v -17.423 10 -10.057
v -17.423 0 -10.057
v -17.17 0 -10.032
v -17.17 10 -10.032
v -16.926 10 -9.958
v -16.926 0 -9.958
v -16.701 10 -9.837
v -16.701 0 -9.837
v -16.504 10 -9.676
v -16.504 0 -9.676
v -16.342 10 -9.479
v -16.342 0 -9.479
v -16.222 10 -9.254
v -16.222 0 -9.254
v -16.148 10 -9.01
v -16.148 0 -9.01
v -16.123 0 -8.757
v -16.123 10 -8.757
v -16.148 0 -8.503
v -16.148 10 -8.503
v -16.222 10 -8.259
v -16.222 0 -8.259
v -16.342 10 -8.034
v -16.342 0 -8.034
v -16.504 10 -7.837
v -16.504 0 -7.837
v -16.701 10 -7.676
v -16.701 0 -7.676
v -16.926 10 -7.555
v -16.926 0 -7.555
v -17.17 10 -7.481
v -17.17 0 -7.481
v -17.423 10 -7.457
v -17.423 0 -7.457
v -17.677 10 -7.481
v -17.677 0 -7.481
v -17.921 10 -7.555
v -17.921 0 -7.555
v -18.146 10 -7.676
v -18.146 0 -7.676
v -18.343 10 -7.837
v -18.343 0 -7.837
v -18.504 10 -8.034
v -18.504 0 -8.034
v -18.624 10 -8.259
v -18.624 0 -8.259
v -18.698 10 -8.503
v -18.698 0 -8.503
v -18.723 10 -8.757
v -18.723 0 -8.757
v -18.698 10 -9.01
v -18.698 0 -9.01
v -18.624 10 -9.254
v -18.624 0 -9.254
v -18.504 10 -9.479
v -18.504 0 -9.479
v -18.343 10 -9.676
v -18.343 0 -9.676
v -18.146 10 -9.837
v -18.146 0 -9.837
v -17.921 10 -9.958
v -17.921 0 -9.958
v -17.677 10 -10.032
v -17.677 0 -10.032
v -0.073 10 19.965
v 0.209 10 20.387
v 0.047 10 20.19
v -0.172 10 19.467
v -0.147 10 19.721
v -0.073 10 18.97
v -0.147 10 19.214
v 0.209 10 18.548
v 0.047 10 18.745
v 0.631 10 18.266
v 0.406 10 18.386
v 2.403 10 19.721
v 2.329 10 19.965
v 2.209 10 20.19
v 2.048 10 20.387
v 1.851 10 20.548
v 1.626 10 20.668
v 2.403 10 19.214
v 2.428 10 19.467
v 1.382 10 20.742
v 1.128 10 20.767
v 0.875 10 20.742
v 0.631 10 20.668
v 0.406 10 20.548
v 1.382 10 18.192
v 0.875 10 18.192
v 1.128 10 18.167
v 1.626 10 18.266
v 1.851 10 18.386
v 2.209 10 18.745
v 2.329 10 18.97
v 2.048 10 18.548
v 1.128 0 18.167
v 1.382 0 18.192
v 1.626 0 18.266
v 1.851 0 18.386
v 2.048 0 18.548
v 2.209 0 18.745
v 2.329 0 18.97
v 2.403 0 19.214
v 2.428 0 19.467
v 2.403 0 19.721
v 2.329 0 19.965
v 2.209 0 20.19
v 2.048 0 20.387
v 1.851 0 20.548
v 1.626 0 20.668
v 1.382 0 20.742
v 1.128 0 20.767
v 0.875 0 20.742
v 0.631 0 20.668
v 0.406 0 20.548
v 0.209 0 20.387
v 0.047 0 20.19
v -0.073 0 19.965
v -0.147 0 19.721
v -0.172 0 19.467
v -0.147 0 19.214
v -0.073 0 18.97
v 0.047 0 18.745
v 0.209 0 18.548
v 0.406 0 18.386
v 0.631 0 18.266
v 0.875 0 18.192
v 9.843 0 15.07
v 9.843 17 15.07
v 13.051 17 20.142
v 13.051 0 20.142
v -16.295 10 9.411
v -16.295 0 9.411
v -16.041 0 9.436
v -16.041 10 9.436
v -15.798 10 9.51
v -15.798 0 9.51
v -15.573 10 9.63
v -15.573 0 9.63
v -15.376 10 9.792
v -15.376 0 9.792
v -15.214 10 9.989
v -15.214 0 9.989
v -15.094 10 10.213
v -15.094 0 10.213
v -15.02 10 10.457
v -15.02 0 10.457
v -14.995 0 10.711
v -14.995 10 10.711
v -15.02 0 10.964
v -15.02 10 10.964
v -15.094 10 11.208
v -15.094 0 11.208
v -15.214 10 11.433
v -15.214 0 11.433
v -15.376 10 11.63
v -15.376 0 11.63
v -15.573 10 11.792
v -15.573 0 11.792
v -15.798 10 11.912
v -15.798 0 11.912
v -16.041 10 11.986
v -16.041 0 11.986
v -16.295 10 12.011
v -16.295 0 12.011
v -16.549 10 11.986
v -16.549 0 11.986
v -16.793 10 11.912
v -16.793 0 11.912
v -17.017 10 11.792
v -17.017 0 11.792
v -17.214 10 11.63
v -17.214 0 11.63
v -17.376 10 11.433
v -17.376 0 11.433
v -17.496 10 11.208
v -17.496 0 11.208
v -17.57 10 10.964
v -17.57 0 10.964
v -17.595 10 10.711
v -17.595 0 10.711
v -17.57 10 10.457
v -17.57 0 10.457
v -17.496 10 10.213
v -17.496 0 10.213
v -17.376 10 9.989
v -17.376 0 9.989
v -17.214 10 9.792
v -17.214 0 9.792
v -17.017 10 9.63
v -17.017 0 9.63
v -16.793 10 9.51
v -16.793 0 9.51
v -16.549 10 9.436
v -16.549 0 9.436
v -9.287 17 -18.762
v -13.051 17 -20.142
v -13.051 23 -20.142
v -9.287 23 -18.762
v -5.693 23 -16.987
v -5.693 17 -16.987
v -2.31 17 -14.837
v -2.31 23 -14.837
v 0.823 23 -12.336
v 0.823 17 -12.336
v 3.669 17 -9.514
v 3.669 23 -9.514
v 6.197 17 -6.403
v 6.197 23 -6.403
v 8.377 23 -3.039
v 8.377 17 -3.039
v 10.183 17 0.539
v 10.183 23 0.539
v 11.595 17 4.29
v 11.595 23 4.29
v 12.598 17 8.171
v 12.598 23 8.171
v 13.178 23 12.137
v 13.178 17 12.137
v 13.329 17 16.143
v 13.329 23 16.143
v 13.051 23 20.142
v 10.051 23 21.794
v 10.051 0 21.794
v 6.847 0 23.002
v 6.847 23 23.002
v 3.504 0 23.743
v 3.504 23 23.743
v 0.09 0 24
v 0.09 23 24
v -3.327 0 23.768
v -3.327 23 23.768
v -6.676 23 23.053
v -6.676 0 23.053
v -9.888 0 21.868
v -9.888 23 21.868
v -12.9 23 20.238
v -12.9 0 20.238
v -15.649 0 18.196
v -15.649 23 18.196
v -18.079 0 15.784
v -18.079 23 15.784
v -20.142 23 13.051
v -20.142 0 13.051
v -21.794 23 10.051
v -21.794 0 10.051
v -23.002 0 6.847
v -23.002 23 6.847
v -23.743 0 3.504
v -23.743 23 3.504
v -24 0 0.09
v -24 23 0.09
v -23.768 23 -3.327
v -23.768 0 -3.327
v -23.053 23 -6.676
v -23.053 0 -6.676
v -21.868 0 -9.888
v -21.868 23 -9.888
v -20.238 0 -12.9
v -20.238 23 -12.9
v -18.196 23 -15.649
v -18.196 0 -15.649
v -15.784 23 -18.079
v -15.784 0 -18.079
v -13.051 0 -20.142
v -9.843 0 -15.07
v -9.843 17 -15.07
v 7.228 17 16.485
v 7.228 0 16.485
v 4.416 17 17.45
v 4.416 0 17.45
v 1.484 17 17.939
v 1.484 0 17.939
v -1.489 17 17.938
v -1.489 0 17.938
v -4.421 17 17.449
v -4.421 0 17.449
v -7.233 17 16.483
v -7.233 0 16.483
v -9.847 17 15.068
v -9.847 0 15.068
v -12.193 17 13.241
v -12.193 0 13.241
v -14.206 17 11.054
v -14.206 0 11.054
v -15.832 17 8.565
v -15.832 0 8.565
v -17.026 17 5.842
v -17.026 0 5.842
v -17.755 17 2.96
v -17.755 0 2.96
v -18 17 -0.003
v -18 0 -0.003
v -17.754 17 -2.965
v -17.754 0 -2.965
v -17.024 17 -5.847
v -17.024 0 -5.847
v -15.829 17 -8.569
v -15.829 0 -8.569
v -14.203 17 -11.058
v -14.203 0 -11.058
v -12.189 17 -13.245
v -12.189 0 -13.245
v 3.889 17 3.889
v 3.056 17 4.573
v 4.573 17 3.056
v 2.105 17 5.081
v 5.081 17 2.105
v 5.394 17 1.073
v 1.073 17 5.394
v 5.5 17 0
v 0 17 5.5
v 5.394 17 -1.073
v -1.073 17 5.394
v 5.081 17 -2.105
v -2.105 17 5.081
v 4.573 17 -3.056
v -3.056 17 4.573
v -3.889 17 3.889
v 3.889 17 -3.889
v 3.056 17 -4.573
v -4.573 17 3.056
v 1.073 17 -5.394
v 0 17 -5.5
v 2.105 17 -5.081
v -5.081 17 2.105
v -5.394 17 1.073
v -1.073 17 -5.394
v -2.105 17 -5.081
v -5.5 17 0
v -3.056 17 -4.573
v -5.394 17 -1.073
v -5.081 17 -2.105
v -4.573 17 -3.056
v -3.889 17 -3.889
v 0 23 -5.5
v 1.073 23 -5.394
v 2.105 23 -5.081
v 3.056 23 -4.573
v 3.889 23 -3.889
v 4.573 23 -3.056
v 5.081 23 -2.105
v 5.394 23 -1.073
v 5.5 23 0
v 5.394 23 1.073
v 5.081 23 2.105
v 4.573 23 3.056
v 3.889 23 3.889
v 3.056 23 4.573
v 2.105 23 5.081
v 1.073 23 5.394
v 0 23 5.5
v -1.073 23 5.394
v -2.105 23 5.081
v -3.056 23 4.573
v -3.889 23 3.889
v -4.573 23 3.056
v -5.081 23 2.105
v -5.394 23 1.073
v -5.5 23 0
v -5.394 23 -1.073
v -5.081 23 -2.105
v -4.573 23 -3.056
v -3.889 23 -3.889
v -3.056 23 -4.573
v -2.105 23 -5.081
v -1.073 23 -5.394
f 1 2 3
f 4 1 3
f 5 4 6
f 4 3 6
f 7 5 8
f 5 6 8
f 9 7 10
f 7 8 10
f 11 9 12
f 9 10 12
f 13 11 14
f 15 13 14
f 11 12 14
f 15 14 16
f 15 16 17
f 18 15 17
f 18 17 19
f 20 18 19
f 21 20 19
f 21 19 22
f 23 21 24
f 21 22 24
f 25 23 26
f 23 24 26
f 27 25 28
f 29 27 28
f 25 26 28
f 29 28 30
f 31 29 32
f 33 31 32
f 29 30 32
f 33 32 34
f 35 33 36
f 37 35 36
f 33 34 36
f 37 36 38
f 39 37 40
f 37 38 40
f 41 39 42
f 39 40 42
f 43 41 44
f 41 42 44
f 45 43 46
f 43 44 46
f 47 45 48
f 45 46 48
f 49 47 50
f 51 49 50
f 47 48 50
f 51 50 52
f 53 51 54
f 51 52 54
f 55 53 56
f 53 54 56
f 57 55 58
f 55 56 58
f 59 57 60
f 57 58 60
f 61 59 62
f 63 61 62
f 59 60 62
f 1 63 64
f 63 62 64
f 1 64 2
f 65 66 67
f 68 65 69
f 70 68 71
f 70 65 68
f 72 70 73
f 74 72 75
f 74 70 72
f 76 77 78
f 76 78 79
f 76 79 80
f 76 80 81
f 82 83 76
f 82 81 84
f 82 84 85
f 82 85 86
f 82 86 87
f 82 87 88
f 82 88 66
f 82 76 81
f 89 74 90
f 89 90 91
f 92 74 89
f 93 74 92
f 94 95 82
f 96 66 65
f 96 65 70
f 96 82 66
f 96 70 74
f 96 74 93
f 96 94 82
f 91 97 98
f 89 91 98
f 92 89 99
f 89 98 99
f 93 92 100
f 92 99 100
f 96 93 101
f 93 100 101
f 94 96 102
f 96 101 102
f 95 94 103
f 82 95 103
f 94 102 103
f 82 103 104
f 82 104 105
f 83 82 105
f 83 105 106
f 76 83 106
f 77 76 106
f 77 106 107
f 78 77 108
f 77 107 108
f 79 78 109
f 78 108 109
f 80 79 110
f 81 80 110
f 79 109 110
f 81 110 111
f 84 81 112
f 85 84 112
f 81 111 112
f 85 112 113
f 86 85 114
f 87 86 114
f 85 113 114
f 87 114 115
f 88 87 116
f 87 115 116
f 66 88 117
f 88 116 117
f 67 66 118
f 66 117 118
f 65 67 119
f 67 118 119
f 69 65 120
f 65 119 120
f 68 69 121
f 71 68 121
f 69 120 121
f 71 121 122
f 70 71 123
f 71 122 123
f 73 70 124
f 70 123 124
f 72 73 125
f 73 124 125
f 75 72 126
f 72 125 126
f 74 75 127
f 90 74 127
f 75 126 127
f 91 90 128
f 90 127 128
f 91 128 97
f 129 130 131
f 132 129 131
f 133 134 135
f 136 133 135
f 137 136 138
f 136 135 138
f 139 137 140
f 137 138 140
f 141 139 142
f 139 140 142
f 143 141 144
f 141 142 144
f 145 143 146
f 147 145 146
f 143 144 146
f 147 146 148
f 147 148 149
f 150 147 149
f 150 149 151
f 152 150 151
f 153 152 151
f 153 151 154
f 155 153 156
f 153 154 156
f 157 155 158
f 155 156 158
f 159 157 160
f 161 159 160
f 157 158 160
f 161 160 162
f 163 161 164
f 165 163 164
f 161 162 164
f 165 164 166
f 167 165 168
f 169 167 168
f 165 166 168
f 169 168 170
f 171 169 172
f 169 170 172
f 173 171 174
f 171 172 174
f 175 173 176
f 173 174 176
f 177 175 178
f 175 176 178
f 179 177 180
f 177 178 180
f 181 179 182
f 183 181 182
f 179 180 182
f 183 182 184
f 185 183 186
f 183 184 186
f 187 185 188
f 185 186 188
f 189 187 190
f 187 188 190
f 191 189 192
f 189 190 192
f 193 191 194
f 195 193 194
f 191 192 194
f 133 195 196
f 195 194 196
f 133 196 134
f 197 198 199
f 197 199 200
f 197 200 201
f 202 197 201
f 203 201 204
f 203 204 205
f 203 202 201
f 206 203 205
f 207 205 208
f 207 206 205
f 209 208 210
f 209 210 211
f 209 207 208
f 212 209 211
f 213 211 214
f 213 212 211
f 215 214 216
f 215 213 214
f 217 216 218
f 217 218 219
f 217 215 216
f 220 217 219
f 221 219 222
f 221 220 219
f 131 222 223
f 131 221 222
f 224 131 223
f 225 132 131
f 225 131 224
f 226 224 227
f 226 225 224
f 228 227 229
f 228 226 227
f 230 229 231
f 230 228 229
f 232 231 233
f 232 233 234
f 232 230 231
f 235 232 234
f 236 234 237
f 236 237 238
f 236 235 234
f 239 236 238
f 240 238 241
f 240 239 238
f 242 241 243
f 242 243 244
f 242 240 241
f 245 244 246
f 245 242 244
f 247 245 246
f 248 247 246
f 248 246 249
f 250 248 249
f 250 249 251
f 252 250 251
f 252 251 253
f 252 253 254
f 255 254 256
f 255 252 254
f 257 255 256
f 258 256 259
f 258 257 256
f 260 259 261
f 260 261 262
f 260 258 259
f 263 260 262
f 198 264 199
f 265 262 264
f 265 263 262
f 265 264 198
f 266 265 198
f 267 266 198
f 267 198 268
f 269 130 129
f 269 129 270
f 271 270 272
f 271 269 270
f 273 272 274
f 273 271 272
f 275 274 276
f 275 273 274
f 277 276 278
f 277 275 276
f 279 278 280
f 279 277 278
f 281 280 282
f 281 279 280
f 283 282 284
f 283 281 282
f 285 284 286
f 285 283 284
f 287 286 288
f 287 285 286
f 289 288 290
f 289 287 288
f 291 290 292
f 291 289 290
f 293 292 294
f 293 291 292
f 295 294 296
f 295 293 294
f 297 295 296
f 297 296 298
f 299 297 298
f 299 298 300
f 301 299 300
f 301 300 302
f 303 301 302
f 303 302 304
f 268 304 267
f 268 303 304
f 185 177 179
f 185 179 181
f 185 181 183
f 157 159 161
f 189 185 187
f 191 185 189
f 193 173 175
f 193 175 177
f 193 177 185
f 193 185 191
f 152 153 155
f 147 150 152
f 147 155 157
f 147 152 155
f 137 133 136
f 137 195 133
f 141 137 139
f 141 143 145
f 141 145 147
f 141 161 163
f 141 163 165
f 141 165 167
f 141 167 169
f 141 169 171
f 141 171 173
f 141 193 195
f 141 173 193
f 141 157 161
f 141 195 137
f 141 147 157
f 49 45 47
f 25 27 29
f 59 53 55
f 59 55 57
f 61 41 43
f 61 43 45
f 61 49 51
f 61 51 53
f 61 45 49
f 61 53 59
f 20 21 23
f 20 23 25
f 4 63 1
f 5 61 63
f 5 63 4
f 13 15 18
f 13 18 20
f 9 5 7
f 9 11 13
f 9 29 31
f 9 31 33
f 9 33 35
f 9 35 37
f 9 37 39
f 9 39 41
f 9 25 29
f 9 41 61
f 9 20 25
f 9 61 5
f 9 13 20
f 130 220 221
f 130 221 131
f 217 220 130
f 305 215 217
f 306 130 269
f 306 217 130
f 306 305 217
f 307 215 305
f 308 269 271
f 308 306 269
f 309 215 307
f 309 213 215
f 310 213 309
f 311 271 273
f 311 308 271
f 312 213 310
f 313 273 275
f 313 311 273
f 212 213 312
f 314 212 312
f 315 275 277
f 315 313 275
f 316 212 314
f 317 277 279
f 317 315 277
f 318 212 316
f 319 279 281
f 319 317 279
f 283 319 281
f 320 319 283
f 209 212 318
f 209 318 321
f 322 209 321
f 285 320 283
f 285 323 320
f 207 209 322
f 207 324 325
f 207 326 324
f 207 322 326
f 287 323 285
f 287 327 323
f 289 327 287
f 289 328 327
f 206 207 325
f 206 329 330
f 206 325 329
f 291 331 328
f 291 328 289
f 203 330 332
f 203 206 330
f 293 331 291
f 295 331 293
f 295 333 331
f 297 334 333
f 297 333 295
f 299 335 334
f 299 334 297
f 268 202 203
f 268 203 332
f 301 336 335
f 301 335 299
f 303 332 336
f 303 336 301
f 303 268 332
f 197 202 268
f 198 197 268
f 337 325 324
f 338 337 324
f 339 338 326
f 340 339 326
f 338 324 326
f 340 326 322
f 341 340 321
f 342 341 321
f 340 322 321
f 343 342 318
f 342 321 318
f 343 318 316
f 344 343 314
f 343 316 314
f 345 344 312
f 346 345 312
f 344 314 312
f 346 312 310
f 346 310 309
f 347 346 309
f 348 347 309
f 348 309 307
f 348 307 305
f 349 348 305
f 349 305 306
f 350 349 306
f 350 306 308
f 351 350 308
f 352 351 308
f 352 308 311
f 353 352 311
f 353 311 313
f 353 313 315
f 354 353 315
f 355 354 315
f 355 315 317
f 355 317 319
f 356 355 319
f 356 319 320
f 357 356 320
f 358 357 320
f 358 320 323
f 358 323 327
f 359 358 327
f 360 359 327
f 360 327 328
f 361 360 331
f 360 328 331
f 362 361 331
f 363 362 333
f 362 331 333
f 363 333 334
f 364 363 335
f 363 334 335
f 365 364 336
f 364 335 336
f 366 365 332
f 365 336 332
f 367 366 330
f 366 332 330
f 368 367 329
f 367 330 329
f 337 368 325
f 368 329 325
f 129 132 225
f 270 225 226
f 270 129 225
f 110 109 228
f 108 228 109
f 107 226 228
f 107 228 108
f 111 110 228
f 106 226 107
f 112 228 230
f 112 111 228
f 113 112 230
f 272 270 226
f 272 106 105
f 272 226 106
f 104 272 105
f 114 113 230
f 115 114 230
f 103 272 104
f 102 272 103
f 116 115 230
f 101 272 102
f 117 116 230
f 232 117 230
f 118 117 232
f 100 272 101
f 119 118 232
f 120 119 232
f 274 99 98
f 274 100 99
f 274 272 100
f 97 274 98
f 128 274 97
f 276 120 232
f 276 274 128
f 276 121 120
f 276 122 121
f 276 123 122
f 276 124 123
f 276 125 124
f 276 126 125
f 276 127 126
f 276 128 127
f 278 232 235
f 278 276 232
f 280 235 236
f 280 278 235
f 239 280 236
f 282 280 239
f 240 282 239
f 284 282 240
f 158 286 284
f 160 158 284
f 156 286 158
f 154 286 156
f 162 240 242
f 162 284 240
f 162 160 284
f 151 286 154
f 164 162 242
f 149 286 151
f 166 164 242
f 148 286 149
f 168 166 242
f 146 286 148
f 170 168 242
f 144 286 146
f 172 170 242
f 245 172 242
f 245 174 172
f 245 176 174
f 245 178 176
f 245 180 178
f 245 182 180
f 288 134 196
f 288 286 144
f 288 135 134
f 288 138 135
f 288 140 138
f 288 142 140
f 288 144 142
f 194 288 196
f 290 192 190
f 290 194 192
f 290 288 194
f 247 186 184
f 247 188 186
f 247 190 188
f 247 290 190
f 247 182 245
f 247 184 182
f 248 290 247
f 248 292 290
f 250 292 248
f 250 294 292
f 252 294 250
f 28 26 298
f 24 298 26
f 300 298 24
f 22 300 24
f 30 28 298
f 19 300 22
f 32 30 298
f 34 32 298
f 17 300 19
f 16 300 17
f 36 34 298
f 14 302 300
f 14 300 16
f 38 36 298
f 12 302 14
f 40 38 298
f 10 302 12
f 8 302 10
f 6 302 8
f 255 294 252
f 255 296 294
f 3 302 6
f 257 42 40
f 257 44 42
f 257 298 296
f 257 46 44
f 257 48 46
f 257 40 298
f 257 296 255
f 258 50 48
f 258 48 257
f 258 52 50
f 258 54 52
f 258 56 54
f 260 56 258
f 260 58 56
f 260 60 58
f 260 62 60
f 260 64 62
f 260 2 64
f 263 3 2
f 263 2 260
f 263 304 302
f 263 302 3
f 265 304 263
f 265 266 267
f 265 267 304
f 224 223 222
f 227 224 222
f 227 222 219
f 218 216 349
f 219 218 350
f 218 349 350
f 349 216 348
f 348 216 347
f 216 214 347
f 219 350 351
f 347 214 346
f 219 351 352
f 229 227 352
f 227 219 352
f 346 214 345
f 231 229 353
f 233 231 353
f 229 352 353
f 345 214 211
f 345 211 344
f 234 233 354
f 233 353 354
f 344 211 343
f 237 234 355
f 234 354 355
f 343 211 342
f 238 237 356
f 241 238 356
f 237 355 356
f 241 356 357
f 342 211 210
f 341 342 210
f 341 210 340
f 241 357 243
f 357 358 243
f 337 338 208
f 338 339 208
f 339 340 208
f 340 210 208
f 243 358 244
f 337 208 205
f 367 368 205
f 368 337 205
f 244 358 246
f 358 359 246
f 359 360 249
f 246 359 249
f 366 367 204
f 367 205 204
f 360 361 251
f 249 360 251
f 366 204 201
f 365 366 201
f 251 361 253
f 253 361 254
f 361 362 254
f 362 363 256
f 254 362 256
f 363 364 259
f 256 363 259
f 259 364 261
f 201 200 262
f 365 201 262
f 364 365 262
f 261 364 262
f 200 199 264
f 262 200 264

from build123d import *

# Parameters (mm, degrees)
EXTRUDE_2_DEPTH     = 17
EXTRUDE_3_DEPTH     = 6
SKETCH_5_R          = 4.5
CUT_EXTRUDE_1_DEPTH = 6
SKETCH_7_R          = 1.3
CUT_EXTRUDE_2_DEPTH = 10
SKETCH1_R           = 5.5
CUT_EXTRUDE1_DEPTH  = 38.960505792
CUT_EXTRUDE_3_REACH = 39.961
SKETCH_10_R         = 18


with BuildPart() as part:
    # 草图2 → 凸台-拉伸2 (new body)
    with BuildSketch(Plane(origin=(0, 0, 0), x_dir=(1, 0, 0), z_dir=(0, 1, 0))):
        with BuildLine():
            Line((-13.050585614, 20.141554437), (-8.239089232, 12.534648325))
            ThreePointArc((-8.239089232, 12.534648325), (-12.534648325, -8.239089232), (8.239089232, -12.534648325))
            Line((8.239089232, -12.534648325), (13.050585614, -20.141554437))
            ThreePointArc((13.050585614, -20.141554437), (-20.141554437, -13.050585614), (-13.050585614, 20.141554437))
        make_face()
    extrude(amount=EXTRUDE_2_DEPTH)

    # 草图4 → 凸台-拉伸3 (add)
    with BuildSketch(Plane(origin=(0, 17, 0), x_dir=(1, 0, 0), z_dir=(0, 1, 0))):
        with BuildLine():
            ThreePointArc((13.050585614, -20.141554437), (-20.141554437, -13.050585614), (-13.050585614, 20.141554437))
            ThreePointArc((-13.050585614, 20.141554437), (7.331987605, 4.750712377), (13.050585614, -20.141554437))
        make_face()
    extrude(amount=EXTRUDE_3_DEPTH)

    # 草图5 → 切除-拉伸1 (cut)
    with BuildSketch(Plane(origin=(0, 23, 0), x_dir=(1, 0, 0), z_dir=(0, 1, 0))):
        with Locations(Location((0, 0, 0), (0, 0, 270))):
            Circle(SKETCH_5_R)
    extrude(amount=-CUT_EXTRUDE_1_DEPTH, mode=Mode.SUBTRACT)

    # 草图7 → 切除-拉伸2 (cut)
    with BuildSketch(Plane.XZ):
        with Locations(Location((-17.423360164, -8.756513039, 0), (0, 0, 270))):
            Circle(SKETCH_7_R)
        with Locations(Location((-16.295042822, 10.710816001, 0), (0, 0, 270))):
            Circle(SKETCH_7_R)
        with Locations(Location((1.128317341, 19.467329041, 0), (0, 0, 270))):
            Circle(SKETCH_7_R)
    extrude(amount=-CUT_EXTRUDE_2_DEPTH, mode=Mode.SUBTRACT)

    # Sketch1 → Cut-Extrude1 (cut, through all)
    with BuildSketch(Plane.XZ.offset(-17)):
        with Locations(Location((0, 0, 0), (0, 0, 270))):
            Circle(SKETCH1_R)
    extrude(amount=-CUT_EXTRUDE1_DEPTH, mode=Mode.SUBTRACT)

    # 草图10 → 切除-拉伸3 (cut, up to next)
    with BuildSketch(Plane.XZ.offset(-17), mode=Mode.PRIVATE) as cut_extrude_3_sk1:
        Circle(SKETCH_10_R)
    cut_extrude_3_tool1 = extrude(cut_extrude_3_sk1.sketch, amount=CUT_EXTRUDE_3_REACH, mode=Mode.PRIVATE) & part.part
    add(cut_extrude_3_tool1.solids().sort_by_distance((0, 17, 0))[0], mode=Mode.SUBTRACT)


solid = part.part
